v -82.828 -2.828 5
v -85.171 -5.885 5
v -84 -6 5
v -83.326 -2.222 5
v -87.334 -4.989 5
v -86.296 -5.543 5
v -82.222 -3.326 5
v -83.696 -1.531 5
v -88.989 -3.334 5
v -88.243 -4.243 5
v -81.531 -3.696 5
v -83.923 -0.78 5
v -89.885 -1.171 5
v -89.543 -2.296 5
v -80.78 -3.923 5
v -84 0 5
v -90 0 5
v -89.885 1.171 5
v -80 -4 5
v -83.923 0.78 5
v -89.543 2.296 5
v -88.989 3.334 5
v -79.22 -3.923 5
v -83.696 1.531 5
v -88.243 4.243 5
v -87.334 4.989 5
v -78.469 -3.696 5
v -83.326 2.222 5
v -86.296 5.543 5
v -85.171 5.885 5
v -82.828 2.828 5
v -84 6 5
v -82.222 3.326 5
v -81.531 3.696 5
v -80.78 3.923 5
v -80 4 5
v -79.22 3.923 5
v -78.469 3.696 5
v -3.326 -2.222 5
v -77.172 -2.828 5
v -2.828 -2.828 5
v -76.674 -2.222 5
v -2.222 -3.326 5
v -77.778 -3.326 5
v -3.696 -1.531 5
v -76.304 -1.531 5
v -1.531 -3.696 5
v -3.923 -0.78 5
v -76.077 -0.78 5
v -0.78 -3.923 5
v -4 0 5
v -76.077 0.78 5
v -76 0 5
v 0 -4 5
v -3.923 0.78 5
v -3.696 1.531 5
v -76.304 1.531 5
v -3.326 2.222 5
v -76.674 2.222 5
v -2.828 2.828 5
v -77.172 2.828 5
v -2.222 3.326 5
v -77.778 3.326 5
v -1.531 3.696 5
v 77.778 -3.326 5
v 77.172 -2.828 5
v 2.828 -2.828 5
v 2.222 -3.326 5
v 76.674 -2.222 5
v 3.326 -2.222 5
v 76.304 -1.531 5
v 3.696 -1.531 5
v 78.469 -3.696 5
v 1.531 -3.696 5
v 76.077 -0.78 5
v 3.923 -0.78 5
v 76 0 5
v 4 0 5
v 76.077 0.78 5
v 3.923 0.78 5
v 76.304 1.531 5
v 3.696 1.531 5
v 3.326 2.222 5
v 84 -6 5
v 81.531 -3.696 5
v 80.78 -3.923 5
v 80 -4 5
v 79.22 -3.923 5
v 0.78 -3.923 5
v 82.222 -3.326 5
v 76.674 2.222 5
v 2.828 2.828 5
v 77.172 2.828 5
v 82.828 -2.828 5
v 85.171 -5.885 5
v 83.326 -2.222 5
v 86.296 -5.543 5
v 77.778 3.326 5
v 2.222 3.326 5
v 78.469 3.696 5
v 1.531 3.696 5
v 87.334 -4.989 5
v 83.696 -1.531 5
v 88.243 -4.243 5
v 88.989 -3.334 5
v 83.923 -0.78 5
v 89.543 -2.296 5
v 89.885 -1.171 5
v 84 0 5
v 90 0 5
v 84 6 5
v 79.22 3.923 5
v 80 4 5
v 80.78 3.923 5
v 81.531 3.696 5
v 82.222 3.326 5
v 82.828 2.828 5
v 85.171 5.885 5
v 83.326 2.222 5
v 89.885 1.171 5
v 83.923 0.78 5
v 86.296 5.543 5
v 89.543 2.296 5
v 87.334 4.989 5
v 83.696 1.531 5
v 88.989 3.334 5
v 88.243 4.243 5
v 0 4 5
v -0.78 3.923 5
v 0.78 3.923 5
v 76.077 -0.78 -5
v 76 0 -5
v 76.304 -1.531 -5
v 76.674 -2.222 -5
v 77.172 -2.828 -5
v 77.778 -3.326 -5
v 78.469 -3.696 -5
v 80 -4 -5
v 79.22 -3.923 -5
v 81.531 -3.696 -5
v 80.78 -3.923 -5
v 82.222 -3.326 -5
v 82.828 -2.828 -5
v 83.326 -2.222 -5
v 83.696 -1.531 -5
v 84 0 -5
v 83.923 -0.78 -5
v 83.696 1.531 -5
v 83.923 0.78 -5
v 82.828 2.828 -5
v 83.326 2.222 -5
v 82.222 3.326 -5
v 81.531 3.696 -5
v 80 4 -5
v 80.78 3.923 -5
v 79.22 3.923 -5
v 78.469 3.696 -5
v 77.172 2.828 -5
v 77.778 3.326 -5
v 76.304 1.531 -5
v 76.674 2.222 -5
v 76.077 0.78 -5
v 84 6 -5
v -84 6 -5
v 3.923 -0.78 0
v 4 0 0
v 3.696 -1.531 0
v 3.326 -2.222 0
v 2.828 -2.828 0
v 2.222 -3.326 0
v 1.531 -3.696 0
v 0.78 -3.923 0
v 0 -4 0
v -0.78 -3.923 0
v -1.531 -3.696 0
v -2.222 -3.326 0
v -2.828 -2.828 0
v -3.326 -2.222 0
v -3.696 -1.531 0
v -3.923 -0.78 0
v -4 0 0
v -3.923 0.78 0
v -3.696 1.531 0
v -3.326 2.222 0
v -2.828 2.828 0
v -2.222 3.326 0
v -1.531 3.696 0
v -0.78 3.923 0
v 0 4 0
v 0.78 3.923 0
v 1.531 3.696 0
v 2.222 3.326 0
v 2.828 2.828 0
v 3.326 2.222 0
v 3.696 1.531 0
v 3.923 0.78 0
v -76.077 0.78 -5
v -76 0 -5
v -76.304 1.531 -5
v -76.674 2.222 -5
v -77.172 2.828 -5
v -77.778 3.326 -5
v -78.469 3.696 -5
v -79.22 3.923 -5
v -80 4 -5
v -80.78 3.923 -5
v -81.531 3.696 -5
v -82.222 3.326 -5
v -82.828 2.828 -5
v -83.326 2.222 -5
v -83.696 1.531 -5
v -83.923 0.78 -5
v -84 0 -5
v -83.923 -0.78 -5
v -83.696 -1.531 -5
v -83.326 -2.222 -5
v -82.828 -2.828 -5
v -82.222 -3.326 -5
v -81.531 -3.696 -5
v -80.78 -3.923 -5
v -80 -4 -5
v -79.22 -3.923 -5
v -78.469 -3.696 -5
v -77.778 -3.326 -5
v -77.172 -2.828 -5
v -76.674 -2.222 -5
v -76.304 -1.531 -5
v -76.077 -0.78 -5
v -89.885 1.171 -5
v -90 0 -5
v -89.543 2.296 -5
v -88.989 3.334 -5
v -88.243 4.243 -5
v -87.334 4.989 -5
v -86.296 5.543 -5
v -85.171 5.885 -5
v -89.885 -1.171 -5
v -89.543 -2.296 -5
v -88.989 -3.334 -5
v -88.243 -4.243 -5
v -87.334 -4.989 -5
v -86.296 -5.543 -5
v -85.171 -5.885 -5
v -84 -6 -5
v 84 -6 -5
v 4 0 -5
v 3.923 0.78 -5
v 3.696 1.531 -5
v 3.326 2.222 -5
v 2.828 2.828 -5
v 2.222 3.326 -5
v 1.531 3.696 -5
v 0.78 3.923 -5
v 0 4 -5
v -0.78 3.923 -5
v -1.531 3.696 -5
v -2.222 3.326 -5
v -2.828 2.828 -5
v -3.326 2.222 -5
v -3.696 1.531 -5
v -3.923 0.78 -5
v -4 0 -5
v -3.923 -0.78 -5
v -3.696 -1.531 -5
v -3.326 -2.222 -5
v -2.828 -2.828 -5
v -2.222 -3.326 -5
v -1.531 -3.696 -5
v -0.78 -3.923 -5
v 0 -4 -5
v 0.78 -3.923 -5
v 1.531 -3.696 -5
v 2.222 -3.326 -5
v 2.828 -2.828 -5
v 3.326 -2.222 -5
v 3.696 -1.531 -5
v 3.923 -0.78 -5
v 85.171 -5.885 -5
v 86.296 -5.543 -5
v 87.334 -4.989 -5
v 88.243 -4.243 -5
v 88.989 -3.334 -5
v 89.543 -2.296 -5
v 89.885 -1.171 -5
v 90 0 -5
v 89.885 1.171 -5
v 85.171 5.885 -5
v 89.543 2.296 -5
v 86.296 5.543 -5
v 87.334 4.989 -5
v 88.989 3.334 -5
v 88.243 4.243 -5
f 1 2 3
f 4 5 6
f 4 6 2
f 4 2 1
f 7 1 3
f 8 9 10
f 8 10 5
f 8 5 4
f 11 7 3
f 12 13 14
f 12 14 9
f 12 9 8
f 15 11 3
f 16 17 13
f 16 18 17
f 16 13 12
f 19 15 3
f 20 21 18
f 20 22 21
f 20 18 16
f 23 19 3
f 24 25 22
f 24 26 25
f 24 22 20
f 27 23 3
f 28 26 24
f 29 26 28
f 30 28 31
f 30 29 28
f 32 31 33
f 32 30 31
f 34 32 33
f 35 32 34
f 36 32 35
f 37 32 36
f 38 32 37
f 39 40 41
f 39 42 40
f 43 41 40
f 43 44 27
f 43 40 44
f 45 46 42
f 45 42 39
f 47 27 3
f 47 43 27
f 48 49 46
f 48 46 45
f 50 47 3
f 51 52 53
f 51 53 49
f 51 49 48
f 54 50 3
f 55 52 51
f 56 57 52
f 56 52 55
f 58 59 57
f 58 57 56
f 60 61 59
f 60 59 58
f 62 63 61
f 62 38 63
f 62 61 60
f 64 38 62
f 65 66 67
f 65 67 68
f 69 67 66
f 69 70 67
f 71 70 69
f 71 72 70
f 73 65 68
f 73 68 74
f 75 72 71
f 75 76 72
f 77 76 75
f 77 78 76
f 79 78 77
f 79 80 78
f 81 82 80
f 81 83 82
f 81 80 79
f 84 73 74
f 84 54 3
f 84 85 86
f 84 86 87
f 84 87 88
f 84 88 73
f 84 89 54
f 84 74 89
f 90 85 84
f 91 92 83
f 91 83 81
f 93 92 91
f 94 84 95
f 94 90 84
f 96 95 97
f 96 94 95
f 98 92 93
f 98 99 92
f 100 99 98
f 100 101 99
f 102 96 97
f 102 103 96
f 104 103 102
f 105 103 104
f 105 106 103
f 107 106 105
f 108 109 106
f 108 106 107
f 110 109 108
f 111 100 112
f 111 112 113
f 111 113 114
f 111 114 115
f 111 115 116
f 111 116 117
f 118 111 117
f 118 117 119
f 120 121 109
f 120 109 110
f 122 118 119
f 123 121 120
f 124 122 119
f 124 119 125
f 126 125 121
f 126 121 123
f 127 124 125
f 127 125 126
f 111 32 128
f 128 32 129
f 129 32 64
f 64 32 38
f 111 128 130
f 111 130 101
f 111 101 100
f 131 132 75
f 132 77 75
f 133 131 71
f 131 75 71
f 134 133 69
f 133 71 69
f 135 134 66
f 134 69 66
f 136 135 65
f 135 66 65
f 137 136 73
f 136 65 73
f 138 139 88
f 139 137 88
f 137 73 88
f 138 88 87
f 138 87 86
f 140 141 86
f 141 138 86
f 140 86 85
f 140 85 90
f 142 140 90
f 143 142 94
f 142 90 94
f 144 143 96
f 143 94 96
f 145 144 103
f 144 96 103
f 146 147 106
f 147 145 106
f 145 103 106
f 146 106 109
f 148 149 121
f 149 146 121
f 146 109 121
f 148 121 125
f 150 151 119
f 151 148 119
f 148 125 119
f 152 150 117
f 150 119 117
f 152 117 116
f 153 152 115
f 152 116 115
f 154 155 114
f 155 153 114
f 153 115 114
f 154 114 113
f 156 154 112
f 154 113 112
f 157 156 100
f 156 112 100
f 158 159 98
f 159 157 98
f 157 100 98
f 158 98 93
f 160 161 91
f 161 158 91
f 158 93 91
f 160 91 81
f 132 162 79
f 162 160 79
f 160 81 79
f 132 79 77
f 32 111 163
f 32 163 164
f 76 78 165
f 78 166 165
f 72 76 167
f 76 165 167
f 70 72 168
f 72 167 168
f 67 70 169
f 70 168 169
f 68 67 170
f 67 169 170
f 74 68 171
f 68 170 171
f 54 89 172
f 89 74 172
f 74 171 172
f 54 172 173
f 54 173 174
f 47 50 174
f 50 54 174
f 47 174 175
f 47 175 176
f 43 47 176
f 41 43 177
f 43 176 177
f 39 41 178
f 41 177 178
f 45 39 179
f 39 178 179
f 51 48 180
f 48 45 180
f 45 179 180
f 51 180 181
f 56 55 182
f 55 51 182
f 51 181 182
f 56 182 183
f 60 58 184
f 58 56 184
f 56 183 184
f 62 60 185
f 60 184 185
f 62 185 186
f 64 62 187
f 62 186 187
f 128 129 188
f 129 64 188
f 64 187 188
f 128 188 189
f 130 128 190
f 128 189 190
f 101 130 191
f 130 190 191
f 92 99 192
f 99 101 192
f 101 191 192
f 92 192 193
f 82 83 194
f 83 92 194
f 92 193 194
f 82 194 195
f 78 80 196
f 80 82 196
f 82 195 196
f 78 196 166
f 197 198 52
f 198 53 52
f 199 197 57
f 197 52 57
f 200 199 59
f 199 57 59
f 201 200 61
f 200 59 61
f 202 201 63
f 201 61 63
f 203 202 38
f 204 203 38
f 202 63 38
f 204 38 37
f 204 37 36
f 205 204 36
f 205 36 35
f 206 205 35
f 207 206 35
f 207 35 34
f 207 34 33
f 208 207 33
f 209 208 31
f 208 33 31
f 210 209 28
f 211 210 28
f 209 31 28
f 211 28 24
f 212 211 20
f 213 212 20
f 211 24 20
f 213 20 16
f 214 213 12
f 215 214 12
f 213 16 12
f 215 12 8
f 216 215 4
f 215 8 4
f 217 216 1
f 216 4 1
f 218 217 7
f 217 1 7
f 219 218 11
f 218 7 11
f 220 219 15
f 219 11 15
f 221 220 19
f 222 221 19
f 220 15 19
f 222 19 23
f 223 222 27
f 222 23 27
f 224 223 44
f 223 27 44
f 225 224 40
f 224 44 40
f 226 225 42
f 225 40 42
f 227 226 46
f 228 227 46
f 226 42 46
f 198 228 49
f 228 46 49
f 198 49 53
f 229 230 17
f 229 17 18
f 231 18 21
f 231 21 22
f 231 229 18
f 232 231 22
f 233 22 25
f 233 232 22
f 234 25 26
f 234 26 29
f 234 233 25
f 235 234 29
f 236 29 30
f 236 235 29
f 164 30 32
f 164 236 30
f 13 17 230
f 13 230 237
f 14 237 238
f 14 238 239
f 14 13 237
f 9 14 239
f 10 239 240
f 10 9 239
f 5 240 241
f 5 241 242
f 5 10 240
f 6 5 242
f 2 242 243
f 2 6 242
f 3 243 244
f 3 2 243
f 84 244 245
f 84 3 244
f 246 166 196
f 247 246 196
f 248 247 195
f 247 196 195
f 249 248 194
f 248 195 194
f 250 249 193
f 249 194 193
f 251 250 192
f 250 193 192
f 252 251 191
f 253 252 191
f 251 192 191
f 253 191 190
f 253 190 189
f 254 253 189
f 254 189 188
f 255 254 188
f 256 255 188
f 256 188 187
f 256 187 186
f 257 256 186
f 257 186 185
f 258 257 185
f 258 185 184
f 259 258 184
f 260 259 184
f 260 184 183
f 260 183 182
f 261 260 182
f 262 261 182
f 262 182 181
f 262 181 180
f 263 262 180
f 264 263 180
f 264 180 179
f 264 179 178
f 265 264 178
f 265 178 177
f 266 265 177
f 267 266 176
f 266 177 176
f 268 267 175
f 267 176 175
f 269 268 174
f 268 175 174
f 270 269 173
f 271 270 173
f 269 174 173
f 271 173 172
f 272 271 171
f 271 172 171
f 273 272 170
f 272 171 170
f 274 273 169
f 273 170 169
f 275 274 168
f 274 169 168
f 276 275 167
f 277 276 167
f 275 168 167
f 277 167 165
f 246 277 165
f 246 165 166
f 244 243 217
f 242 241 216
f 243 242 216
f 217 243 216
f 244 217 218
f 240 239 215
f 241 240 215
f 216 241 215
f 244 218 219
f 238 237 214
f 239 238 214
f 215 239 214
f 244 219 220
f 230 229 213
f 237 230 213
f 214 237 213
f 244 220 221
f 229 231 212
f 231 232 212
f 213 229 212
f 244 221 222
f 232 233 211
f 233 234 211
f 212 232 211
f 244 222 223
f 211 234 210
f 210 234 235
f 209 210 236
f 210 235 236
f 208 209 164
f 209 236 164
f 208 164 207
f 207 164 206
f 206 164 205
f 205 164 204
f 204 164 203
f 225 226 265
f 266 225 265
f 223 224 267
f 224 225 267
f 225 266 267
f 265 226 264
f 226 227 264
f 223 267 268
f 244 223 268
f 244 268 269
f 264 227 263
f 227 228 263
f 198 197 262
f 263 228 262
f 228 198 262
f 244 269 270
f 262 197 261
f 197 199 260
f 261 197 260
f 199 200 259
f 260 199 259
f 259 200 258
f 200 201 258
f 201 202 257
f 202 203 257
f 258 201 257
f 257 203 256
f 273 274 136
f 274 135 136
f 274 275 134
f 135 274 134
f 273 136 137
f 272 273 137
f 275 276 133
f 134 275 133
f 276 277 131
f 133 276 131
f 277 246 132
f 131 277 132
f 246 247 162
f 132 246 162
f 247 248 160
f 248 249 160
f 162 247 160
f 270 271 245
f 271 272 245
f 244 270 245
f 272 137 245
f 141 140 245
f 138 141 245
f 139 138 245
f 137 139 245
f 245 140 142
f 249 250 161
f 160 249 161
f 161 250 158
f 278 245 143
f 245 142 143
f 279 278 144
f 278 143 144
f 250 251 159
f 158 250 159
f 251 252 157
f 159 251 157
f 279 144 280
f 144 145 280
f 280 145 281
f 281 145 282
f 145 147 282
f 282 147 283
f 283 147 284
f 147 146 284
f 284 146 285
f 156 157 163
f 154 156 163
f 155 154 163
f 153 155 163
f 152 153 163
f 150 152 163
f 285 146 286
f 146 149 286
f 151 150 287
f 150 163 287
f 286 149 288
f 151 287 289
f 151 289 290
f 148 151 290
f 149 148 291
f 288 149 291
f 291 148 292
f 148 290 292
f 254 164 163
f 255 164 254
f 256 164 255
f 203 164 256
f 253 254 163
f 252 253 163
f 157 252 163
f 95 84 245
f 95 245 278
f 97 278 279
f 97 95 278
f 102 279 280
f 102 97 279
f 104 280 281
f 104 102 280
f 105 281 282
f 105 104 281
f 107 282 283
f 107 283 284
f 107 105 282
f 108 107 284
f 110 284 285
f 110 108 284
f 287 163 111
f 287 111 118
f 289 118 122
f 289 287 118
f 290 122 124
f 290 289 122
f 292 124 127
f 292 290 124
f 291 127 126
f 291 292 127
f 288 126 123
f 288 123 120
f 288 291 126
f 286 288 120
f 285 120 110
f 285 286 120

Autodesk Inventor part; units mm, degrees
ref_plane "YZ Plane" through (0, 0, 0) normal (1, 0, 0) x (0, 1, 0)
ref_plane "XZ Plane" through (0, 0, 0) normal (0, 1, 0) x (-1, 0, 0)
sketch "Sketch1" plane through (0, 0, 0) normal (0, 0, 1) x (1, 0, 0)
  circle A0 centre (0, 0) radius 4
  circle A1 centre (0, 0) radius 5
  line L0 (-90, -6) -> (90, -6)
  line L1 (90, -6) -> (90, 6)
  line L2 (90, 6) -> (-90, 6)
  line L3 (-90, 6) -> (-90, -6)
  line L4 (-90, -6) -> (90, 6) construction
  line L5 (90, -6) -> (-90, 6) construction
  point P0 (0, -5)
  point P1 (0, 5)
  point P2 (0, 0)
  point P3 (0, 0)
  dimension "d11" = 180
  dimension "d14" = 12
ref_plane "Work Plane1" through (0, 0, 5) normal (0, 0, 1) x (1, 0, 0)
extrude "Extrusion3" add sketch "Sketch1" along normal mid plane 10 contours A0 | A1 | L3 L2 L1 L0
extrude "Extrusion4" cut sketch "Sketch1" along normal mid plane 10 contours A0
fillet "Fillet3" radius 6 4 edges at (-90, -6, 0) (-90, 6, 0) (90, 6, 0) (90, -6, 0)
sketch "Sketch4" plane through (0, 0, 5) normal (0, 0, 1) x (1, 0, 0)
  circle A0 centre (0, 0) radius 4 projected
  line L0 (0, 0) -> (-80, 0)
  circle A1 centre (-80, 0) radius 4
  circle A2 centre (-80, 0) radius 6
  line L1 (-84, 6) -> (84, 6) projected
  point P0 (0, 0)
  dimension "d22" = 80
  dimension "d23" = 8
extrude "Extrusion6" cut sketch "Sketch4" against normal blind 10 contours A1
mirror "Mirror2" about plane through (0, 0, 0) normal (1, 0, 0) of "Extrusion6"
properties part number "Lever"
